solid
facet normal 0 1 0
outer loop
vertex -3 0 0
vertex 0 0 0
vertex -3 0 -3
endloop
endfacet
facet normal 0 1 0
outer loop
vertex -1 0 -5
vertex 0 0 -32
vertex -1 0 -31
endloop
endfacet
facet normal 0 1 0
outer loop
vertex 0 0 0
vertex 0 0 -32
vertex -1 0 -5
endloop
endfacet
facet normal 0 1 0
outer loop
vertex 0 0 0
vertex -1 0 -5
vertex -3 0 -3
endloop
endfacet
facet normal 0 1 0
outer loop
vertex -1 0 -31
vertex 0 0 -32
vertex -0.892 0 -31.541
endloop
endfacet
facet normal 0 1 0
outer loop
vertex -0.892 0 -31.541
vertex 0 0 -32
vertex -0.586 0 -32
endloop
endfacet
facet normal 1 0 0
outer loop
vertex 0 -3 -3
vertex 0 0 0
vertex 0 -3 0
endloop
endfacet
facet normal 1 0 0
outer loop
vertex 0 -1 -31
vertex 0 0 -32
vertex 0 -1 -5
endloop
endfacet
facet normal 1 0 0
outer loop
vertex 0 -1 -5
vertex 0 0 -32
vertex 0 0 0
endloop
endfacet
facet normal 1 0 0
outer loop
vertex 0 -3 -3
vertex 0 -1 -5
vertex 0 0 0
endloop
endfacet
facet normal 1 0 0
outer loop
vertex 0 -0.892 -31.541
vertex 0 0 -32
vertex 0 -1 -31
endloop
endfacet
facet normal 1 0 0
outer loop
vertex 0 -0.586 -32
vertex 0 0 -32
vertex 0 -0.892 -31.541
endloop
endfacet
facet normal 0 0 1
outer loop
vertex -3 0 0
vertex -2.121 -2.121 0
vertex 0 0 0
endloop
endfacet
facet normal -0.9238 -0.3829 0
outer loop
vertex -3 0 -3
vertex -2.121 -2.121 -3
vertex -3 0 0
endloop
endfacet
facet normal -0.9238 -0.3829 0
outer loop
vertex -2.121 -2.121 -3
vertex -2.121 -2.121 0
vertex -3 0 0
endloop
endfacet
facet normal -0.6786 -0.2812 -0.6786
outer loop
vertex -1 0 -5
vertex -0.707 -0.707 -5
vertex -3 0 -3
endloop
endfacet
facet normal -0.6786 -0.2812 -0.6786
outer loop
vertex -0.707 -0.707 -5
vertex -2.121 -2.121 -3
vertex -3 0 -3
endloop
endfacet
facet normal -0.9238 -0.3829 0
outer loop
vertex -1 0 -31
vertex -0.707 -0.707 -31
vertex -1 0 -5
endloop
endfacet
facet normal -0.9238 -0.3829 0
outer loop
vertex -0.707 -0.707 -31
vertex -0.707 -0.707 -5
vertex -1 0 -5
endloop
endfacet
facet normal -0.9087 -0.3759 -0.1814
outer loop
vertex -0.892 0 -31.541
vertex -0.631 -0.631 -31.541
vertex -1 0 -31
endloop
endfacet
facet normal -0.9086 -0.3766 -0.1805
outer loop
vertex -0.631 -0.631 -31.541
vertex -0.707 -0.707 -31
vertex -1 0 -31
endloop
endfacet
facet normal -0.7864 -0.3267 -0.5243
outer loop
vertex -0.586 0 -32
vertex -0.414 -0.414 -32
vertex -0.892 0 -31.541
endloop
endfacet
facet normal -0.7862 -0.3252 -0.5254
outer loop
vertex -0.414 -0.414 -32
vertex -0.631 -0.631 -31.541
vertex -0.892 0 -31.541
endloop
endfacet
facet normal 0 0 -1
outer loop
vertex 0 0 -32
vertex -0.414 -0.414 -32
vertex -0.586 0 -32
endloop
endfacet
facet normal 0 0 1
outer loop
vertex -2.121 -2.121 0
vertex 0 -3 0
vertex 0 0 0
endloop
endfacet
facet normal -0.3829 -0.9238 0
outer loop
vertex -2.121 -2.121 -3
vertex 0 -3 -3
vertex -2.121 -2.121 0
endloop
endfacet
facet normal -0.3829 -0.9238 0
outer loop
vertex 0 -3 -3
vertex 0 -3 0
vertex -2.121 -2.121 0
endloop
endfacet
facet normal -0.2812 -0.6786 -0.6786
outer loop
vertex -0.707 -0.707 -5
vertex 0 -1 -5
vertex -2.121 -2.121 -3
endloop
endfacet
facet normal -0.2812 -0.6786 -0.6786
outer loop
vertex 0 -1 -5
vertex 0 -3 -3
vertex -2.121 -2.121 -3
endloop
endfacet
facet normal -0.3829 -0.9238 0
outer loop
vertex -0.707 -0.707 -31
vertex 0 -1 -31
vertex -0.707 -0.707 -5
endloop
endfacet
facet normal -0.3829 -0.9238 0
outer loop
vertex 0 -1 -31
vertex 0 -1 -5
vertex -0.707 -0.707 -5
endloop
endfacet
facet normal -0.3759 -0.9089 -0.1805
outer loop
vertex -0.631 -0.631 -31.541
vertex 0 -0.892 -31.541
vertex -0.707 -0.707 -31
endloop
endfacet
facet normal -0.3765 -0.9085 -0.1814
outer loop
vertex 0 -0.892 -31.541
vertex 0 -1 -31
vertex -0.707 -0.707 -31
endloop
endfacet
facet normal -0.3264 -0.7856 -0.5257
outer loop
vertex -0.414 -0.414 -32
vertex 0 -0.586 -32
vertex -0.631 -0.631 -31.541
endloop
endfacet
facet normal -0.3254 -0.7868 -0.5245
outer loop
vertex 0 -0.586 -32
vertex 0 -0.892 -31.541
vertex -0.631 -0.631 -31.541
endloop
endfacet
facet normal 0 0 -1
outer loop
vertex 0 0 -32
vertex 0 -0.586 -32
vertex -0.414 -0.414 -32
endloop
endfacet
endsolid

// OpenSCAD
// Isolated operands used to prove rim / seal / floor profiles are closed solids.
use <../RuggedBoxCustomeDividersV1.0.scad>

part = "corner";

if (part == "corner")
    rotate_extrude(angle = 90, $fn = 8) Wall2D(2, 0, 32, true, true);
else if (part == "side")
    rotate([90, 0, 90]) linear_extrude(30) Wall2D(2, 0, 32, true, false);
else if (part == "seal")
    rotate_extrude(angle = 90, $fn = 8) translate([2, 0]) circle(1.1, $fn = 64);
else if (part == "bead")
    rotate_extrude(angle = 90, $fn = 8) translate([2, 0]) circle(1.1, $fn = 64);
